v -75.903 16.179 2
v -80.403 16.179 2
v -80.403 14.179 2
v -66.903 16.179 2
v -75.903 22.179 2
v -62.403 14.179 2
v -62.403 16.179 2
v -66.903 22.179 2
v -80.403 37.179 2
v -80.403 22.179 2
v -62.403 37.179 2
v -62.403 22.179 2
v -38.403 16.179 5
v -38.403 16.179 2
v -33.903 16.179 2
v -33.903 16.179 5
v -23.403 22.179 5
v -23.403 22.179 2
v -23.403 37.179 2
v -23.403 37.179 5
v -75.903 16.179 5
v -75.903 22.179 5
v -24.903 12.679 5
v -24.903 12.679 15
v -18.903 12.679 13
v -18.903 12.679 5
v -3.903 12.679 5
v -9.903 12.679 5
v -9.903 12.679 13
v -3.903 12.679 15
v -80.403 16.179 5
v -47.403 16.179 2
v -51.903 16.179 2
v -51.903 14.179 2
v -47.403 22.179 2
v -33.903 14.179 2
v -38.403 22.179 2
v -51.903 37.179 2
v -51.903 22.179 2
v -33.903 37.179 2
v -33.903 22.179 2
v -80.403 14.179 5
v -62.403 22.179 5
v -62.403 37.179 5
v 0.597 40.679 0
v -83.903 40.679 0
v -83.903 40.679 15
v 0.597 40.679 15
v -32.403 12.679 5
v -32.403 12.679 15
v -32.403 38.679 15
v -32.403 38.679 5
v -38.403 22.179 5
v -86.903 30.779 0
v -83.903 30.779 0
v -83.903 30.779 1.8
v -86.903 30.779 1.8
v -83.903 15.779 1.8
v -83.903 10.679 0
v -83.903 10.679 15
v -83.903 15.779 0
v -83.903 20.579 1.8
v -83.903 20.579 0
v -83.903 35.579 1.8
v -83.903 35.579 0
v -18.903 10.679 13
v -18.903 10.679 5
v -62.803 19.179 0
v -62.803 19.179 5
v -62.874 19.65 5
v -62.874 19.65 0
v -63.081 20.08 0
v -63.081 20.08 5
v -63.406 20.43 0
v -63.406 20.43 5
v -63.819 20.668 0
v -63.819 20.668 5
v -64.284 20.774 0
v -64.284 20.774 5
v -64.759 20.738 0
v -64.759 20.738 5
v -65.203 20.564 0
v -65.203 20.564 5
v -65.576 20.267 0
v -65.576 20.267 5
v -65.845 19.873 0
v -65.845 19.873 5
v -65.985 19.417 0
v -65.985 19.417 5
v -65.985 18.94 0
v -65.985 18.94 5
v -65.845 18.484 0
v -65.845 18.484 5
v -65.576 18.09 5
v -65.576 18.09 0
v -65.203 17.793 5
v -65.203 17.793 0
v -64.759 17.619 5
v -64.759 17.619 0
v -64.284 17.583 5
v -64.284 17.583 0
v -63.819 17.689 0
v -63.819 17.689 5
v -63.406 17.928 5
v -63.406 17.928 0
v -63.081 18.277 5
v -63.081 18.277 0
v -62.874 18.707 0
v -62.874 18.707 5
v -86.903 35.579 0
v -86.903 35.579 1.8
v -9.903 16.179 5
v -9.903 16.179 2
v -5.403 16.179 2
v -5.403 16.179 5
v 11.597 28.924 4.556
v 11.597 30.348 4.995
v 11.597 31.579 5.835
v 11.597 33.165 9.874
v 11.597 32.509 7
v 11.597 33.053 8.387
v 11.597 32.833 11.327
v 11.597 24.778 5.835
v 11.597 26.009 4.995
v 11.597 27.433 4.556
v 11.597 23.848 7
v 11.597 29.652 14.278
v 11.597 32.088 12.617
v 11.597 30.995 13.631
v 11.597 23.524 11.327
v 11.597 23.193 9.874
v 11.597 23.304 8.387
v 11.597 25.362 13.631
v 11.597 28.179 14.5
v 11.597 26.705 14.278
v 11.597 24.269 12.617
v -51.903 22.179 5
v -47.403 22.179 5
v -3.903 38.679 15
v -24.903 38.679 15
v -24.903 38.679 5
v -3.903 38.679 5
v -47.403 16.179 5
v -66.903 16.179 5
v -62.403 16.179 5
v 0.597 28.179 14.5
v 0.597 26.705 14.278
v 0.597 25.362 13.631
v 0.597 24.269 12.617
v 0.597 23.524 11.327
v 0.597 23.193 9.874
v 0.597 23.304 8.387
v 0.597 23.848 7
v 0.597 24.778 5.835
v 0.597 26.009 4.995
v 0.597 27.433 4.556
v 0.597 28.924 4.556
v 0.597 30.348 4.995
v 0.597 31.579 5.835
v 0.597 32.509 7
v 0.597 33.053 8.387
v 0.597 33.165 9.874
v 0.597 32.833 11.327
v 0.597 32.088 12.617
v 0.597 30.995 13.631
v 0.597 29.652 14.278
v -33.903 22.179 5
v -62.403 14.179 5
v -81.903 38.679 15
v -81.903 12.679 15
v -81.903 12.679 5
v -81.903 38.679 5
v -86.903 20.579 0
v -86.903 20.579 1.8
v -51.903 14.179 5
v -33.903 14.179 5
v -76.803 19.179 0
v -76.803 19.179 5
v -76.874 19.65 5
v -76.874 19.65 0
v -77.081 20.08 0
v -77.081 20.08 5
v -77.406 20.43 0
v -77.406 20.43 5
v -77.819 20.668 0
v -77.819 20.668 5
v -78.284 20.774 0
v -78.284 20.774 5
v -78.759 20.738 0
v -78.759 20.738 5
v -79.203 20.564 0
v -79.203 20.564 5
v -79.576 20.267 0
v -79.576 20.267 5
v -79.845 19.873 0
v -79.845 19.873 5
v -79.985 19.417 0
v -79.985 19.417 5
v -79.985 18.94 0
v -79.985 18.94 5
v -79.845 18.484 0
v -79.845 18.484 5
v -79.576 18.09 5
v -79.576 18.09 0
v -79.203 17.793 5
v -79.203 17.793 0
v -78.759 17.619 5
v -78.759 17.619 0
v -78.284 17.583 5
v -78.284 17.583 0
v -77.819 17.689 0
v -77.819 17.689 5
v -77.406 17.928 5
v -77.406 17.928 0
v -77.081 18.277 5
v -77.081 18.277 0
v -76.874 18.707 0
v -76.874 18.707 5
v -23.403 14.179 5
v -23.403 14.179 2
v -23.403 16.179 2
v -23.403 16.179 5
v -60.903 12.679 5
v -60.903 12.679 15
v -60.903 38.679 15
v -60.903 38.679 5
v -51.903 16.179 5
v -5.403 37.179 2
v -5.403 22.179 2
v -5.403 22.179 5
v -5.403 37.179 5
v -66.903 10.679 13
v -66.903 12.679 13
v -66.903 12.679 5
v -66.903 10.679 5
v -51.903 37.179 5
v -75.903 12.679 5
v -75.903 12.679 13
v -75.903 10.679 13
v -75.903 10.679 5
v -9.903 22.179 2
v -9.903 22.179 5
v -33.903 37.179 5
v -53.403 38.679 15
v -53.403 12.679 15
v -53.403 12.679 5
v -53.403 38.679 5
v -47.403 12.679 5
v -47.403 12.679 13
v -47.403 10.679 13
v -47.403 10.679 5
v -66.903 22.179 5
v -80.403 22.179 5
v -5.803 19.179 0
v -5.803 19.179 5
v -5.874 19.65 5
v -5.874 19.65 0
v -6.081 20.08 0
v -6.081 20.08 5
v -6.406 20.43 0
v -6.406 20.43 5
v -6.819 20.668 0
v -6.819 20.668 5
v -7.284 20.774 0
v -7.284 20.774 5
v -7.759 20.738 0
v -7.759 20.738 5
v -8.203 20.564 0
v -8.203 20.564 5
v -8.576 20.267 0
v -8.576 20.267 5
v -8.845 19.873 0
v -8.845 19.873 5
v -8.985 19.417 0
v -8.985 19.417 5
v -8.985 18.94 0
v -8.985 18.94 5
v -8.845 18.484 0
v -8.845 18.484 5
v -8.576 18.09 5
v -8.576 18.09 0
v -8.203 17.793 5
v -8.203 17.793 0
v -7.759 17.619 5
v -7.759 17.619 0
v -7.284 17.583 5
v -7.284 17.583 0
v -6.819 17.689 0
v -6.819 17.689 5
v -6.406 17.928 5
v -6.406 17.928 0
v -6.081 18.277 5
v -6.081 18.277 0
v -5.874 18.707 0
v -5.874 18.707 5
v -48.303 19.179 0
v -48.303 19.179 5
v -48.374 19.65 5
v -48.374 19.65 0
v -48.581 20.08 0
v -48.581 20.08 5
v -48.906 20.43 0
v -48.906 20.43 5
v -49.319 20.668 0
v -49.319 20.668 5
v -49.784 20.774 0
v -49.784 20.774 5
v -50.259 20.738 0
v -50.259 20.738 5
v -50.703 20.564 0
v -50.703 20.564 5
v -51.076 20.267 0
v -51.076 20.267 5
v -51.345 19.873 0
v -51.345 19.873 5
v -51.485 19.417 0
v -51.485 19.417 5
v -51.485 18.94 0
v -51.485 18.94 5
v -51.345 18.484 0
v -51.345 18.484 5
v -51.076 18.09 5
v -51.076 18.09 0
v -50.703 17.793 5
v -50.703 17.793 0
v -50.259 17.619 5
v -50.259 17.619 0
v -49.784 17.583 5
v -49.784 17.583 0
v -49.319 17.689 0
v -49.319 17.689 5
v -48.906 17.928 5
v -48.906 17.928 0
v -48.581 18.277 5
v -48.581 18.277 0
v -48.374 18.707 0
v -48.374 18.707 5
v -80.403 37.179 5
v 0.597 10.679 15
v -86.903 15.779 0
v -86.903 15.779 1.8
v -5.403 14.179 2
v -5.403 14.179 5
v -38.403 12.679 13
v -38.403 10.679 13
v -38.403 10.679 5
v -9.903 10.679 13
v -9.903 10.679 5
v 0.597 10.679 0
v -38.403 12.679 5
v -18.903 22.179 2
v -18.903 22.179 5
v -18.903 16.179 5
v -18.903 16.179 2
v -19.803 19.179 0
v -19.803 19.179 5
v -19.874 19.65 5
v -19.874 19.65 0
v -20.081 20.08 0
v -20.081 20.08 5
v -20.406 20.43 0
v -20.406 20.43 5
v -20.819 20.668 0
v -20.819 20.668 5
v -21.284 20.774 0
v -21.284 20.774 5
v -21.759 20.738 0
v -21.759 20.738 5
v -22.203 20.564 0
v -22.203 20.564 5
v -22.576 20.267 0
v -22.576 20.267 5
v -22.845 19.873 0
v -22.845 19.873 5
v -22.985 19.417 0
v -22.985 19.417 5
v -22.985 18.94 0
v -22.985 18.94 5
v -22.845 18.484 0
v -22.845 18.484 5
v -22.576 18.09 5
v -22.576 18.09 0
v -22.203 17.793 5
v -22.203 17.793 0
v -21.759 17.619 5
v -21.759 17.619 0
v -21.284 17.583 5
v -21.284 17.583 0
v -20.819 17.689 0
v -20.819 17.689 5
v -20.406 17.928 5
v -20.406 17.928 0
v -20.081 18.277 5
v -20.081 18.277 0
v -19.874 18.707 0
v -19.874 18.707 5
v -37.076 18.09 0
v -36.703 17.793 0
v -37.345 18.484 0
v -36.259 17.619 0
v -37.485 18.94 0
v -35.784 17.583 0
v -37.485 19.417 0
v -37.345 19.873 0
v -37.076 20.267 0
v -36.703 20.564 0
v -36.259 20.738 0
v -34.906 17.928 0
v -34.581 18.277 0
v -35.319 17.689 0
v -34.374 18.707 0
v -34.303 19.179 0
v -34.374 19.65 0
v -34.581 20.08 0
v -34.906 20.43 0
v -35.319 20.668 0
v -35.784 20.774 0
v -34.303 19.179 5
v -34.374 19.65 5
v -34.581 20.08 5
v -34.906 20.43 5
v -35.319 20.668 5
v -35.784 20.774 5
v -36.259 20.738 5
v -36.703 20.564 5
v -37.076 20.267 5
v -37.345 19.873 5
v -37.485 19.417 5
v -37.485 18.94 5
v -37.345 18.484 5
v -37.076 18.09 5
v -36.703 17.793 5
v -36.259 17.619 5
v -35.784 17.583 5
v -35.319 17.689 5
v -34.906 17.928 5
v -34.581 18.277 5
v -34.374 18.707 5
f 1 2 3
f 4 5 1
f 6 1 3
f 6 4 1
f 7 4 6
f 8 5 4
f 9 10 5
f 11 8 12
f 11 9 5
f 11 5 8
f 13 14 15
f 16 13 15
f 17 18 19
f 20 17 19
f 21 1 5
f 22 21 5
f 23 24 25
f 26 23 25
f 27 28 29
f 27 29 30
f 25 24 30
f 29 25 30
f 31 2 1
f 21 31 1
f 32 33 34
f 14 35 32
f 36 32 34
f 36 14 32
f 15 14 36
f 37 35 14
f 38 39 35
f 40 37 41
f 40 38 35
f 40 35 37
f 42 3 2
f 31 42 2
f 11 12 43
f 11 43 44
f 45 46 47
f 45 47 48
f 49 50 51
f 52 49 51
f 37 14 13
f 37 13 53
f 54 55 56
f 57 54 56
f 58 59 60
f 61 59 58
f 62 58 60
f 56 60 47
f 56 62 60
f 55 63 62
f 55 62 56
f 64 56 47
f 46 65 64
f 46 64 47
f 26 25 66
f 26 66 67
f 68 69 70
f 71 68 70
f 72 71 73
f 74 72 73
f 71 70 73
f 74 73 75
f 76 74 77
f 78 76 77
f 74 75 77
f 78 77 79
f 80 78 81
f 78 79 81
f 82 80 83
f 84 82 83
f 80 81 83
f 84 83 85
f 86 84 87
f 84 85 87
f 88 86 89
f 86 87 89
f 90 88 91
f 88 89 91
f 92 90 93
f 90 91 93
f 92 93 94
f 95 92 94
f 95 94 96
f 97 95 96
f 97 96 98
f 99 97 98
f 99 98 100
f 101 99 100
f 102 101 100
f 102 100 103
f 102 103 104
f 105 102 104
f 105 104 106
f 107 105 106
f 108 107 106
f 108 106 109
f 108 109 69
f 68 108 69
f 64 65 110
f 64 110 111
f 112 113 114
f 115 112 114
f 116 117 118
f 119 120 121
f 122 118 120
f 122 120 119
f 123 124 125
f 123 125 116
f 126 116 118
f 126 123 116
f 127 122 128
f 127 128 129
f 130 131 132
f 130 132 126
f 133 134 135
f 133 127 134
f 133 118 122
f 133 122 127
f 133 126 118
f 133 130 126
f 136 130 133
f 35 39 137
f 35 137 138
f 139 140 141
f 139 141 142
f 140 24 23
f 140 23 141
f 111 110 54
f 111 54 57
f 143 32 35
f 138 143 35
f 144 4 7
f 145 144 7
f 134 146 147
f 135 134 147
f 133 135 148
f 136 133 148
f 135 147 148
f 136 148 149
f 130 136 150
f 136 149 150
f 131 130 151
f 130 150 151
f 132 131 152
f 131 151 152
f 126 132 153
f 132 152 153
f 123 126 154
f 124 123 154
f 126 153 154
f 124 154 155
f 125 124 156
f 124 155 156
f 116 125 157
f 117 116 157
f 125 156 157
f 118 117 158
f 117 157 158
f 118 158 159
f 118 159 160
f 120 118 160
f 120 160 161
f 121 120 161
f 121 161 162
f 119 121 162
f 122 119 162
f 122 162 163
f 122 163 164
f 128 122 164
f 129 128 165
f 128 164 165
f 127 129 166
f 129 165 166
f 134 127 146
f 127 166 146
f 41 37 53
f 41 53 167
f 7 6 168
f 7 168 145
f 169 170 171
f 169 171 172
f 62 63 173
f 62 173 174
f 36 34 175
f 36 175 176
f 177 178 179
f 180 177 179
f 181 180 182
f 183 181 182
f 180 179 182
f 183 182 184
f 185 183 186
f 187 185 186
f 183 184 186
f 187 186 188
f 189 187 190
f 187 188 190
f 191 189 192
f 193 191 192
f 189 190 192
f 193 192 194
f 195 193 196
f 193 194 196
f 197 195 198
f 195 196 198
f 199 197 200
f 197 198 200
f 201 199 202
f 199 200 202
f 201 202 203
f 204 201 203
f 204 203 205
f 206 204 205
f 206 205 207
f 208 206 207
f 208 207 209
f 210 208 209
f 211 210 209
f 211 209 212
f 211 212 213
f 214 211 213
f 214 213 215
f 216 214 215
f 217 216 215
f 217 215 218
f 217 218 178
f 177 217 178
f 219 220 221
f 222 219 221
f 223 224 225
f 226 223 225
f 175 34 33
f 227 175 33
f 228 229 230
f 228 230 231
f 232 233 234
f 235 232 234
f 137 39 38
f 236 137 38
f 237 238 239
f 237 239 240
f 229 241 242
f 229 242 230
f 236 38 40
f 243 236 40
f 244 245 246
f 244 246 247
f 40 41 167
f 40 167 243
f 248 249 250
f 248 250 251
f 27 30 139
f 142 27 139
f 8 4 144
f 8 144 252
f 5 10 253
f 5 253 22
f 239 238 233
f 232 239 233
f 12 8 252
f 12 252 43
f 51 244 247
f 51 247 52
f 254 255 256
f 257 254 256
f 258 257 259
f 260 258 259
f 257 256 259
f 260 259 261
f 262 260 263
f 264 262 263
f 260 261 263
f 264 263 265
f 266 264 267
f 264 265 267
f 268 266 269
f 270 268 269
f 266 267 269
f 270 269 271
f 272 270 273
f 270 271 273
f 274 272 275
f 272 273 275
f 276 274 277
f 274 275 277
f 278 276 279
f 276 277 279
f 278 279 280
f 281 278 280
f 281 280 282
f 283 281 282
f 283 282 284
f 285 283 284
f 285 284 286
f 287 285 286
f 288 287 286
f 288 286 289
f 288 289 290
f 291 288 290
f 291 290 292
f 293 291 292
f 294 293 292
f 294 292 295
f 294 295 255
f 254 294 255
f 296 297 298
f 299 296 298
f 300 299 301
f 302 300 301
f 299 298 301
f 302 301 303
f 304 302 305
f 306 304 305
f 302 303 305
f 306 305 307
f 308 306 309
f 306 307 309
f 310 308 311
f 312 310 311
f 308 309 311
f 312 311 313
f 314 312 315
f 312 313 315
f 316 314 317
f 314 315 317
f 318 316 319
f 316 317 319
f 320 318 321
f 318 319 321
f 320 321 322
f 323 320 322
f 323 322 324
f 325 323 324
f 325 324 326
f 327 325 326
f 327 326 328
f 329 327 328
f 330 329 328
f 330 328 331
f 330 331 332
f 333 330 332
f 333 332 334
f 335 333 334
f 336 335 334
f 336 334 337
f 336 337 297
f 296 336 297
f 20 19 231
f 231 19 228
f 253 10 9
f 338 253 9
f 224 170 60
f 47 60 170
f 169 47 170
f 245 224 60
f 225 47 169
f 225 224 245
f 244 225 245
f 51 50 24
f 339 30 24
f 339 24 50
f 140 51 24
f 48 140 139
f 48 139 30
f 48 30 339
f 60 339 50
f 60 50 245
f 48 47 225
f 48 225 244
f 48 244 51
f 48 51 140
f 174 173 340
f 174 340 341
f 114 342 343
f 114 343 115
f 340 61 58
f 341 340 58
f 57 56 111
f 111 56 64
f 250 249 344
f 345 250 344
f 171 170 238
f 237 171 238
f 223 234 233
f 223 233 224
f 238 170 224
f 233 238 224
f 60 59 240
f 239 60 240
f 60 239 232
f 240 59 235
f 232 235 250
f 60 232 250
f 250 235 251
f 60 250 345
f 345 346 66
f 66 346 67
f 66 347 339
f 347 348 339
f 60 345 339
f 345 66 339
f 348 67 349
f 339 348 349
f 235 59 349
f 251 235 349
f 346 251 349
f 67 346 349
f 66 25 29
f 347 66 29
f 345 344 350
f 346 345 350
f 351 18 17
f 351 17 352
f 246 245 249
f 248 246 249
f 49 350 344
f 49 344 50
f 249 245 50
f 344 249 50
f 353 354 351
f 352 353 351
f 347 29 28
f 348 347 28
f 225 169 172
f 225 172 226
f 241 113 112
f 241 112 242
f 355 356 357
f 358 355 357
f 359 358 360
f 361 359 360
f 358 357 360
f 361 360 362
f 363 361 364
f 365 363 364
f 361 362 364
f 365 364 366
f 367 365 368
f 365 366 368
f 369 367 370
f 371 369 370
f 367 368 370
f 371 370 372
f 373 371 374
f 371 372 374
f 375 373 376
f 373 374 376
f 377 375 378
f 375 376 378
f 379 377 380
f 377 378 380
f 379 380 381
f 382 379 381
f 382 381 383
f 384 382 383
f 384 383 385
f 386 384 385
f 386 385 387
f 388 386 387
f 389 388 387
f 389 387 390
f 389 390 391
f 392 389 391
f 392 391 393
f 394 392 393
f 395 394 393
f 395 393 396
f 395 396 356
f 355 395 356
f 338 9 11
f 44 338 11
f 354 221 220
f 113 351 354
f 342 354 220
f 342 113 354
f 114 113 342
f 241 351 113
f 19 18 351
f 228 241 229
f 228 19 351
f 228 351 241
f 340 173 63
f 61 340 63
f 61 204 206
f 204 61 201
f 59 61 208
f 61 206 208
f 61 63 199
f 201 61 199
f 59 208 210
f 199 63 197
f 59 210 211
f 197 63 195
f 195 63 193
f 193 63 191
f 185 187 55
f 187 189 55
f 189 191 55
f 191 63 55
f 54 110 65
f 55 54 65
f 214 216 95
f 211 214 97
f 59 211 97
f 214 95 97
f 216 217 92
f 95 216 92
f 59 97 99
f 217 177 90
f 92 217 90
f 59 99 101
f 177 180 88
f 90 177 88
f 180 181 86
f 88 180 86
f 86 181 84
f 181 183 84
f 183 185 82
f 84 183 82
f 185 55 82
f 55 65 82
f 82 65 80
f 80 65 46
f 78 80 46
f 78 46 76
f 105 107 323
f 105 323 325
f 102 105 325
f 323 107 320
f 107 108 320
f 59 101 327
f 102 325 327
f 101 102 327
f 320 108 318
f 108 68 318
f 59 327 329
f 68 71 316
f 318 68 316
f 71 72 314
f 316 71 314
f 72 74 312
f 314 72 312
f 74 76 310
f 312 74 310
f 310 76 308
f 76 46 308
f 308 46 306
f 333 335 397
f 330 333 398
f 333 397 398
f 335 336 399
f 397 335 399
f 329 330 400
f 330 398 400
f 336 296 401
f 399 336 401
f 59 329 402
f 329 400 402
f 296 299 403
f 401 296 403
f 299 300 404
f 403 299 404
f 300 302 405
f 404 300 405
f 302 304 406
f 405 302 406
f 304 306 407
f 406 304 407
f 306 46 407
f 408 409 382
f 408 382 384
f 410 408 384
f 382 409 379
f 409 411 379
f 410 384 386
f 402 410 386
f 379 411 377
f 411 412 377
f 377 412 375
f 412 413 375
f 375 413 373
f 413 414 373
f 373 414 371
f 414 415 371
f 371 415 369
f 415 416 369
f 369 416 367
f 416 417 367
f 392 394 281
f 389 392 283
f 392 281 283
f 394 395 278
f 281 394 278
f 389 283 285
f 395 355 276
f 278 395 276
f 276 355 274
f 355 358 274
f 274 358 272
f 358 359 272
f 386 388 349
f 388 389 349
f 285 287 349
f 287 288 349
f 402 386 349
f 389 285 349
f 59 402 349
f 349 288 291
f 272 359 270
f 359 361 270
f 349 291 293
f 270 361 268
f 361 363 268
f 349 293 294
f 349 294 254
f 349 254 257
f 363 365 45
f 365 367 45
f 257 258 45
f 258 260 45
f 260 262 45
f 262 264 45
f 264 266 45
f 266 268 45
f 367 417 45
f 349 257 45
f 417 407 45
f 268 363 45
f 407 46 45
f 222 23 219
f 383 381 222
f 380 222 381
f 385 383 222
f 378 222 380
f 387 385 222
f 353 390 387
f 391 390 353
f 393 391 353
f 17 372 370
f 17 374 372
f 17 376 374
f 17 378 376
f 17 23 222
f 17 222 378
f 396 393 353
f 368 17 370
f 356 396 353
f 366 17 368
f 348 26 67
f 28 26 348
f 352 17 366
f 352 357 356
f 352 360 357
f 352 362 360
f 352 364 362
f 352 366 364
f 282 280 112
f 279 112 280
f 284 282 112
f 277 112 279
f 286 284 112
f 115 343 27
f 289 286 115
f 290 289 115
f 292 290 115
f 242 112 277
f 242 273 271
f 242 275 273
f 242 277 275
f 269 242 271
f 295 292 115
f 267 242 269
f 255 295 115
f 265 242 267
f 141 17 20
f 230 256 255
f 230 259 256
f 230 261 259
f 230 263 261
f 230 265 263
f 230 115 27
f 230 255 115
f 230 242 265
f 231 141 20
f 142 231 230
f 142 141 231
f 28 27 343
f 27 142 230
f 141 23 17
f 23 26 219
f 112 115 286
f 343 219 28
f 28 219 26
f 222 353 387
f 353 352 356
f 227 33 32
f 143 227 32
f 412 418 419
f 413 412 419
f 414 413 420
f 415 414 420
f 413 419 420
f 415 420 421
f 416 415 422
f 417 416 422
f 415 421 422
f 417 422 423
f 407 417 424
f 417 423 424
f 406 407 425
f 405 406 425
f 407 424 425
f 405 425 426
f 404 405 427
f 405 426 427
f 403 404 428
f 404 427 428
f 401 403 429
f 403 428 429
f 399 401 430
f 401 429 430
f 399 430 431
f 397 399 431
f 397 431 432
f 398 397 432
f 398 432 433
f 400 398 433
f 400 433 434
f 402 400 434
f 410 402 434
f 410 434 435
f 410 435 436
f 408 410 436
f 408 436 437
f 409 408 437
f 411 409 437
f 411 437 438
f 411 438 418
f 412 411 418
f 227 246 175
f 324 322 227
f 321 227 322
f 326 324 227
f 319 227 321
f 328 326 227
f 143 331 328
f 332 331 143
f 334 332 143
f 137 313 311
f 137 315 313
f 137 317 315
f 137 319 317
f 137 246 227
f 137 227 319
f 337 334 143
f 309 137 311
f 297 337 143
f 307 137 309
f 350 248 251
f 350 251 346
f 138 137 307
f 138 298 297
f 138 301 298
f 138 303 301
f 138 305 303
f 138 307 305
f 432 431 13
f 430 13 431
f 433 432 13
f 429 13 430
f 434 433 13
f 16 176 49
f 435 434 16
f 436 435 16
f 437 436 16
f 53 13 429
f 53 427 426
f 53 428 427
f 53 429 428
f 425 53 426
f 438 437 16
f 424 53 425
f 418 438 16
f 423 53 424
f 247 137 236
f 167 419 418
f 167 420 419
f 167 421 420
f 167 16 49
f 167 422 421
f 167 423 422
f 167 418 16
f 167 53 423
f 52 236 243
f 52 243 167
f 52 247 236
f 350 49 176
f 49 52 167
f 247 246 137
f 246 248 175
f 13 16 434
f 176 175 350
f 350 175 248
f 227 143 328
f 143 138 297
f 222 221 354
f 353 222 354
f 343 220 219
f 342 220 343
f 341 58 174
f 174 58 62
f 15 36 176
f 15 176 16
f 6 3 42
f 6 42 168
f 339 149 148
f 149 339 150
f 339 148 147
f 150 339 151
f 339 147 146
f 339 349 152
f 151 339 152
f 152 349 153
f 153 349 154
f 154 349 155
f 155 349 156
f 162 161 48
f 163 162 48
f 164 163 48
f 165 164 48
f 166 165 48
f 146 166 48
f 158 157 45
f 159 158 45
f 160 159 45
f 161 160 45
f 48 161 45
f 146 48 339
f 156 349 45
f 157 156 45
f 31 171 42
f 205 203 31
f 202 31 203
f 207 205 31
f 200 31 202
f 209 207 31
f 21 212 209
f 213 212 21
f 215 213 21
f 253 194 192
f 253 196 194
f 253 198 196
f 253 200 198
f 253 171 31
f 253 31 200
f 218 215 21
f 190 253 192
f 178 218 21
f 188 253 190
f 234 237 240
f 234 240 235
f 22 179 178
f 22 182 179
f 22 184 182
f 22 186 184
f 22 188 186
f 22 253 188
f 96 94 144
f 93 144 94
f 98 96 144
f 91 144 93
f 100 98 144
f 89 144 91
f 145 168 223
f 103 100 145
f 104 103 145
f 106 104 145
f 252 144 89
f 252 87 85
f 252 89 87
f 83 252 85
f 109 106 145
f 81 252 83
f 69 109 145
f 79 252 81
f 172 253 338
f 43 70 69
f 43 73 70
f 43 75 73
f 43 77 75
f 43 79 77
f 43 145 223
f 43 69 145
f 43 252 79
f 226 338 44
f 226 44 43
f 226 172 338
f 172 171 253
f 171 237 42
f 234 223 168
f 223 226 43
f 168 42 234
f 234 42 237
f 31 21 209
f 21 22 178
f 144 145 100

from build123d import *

# Parameters (mm, degrees)
SKETCH_1_W          = 84.5
SKETCH_1_H          = 30
EXTRUDE_1_DEPTH     = 15
SKETCH_2_W          = 21
SKETCH_2_H          = 26
CUT_EXTRUDE_1_DEPTH = 13
SKETCH_3_W          = 21
SKETCH_3_H          = 26
SKETCH_3_W_2        = 18
SKETCH_3_H_2        = 23
EXTRUDE_2_DEPTH     = 3
SKETCH_5_W          = 4.5
SKETCH_5_H          = 6
EXTRUDE_3_DEPTH     = 3
SKETCH_6_R          = 1.6
CUT_EXTRUDE_2_DEPTH = 94.778887913
SKETCH_7_W          = 9
SKETCH_7_H          = 8
CUT_EXTRUDE_3_DEPTH = 90.714734825
SKETCH_13_W         = 1.8
SKETCH_13_H         = 4.8
EXTRUDE_4_DEPTH     = 3
SKETCH_14_R         = 5
EXTRUDE_5_DEPTH     = 11


with BuildPart() as part:
    # ｽｹｯﾁ1 → ﾎﾞｽ - 押し出し1 (new body)
    with BuildSketch(Plane.XY):
        with Locations((-41.65312059, 25.678571429)):
            Rectangle(SKETCH_1_W, SKETCH_1_H)
    extrude(amount=EXTRUDE_1_DEPTH)

    # ｽｹｯﾁ2 → ｶｯﾄ - 押し出し1 (cut)
    with BuildSketch(Plane.XY.offset(15)):
        with Locations((-71.40312059, 25.678571429)):
            Rectangle(SKETCH_2_W, SKETCH_2_H)
        with Locations((-42.90312059, 25.678571429)):
            Rectangle(SKETCH_2_W, SKETCH_2_H)
        with Locations((-14.40312059, 25.678571429)):
            Rectangle(SKETCH_2_W, SKETCH_2_H)
    extrude(amount=-CUT_EXTRUDE_1_DEPTH, mode=Mode.SUBTRACT)

    # ｽｹｯﾁ3 → ﾎﾞｽ - 押し出し2 (add)
    # profile 1 of 3: a face of its own
    with BuildSketch(Plane.XY.offset(2)):
        with Locations((-71.40312059, 25.678571429)):
            Rectangle(SKETCH_3_W, SKETCH_3_H)
        with Locations((-71.40312059, 25.678571429)):
            Rectangle(SKETCH_3_W_2, SKETCH_3_H_2, mode=Mode.SUBTRACT)
    # profile 2 of 3: a face of its own
    with BuildSketch(Plane.XY.offset(2)):
        with Locations((-42.90312059, 25.678571429)):
            Rectangle(SKETCH_3_W, SKETCH_3_H)
        with Locations((-42.90312059, 25.678571429)):
            Rectangle(SKETCH_3_W_2, SKETCH_3_H_2, mode=Mode.SUBTRACT)
    # profile 3 of 3: a face of its own
    with BuildSketch(Plane.XY.offset(2)):
        with Locations((-14.40312059, 25.678571429)):
            Rectangle(SKETCH_3_W, SKETCH_3_H)
        with Locations((-14.40312059, 25.678571429)):
            Rectangle(SKETCH_3_W_2, SKETCH_3_H_2, mode=Mode.SUBTRACT)
    extrude(amount=EXTRUDE_2_DEPTH)

    # ｽｹｯﾁ5 → ﾎﾞｽ - 押し出し3 (add)
    with BuildSketch(Plane.XY.offset(2)):
        with Locations((-64.65312059, 19.178571429)):
            Rectangle(SKETCH_5_W, SKETCH_5_H)
        with Locations((-78.15312059, 19.178571429)):
            Rectangle(SKETCH_5_W, SKETCH_5_H)
        with Locations((-49.65312059, 19.178571429)):
            Rectangle(SKETCH_5_W, SKETCH_5_H)
        with Locations((-36.15312059, 19.178571429)):
            Rectangle(SKETCH_5_W, SKETCH_5_H)
        with Locations((-21.15312059, 19.178571429)):
            Rectangle(SKETCH_5_W, SKETCH_5_H)
        with Locations((-7.65312059, 19.178571429)):
            Rectangle(SKETCH_5_W, SKETCH_5_H)
    extrude(amount=EXTRUDE_3_DEPTH)

    # ｽｹｯﾁ6 → ｶｯﾄ - 押し出し2 (cut, through all)
    with BuildSketch(Plane.XY.offset(5)):
        with Locations((-64.40312059, 19.178571429)):
            Circle(SKETCH_6_R)
        with Locations((-78.40312059, 19.178571429)):
            Circle(SKETCH_6_R)
        with Locations((-49.90312059, 19.178571429)):
            Circle(SKETCH_6_R)
        with Locations((-35.90312059, 19.178571429)):
            Circle(SKETCH_6_R)
        with Locations((-21.40312059, 19.178571429)):
            Circle(SKETCH_6_R)
        with Locations((-7.40312059, 19.178571429)):
            Circle(SKETCH_6_R)
    extrude(amount=-CUT_EXTRUDE_2_DEPTH, mode=Mode.SUBTRACT)

    # ｽｹｯﾁ7 → ｶｯﾄ - 押し出し3 (cut, through all)
    with BuildSketch(Plane(origin=(0, 12.678571429, 0), x_dir=(1, 0, 0), z_dir=(0, 1, 0))):
        with Locations((-71.40312059, -9)):
            Rectangle(SKETCH_7_W, SKETCH_7_H)
        with Locations((-42.90312059, -9)):
            Rectangle(SKETCH_7_W, SKETCH_7_H)
        with Locations((-14.40312059, -9)):
            Rectangle(SKETCH_7_W, SKETCH_7_H)
    extrude(amount=-CUT_EXTRUDE_3_DEPTH, mode=Mode.SUBTRACT)

    # ｽｹｯﾁ13 → ﾎﾞｽ - 押し出し4 (add)
    with BuildSketch(Plane.ZY.offset(83.90312059)):
        with Locations((0.9, 33.178571429)):
            Rectangle(SKETCH_13_W, SKETCH_13_H)
        with Locations((0.9, 18.178571429)):
            Rectangle(SKETCH_13_W, SKETCH_13_H)
    extrude(amount=EXTRUDE_4_DEPTH)

    # ｽｹｯﾁ14 → ﾎﾞｽ - 押し出し5 (add)
    with BuildSketch(Plane(origin=(0.59687941, 0, 0), x_dir=(0, 0, -1), z_dir=(1, 0, 0))):
        with Locations(Location((-9.5, 28.178571429, 0), (0, 0, 180))):
            Circle(SKETCH_14_R)
    extrude(amount=EXTRUDE_5_DEPTH)


solid = part.part
